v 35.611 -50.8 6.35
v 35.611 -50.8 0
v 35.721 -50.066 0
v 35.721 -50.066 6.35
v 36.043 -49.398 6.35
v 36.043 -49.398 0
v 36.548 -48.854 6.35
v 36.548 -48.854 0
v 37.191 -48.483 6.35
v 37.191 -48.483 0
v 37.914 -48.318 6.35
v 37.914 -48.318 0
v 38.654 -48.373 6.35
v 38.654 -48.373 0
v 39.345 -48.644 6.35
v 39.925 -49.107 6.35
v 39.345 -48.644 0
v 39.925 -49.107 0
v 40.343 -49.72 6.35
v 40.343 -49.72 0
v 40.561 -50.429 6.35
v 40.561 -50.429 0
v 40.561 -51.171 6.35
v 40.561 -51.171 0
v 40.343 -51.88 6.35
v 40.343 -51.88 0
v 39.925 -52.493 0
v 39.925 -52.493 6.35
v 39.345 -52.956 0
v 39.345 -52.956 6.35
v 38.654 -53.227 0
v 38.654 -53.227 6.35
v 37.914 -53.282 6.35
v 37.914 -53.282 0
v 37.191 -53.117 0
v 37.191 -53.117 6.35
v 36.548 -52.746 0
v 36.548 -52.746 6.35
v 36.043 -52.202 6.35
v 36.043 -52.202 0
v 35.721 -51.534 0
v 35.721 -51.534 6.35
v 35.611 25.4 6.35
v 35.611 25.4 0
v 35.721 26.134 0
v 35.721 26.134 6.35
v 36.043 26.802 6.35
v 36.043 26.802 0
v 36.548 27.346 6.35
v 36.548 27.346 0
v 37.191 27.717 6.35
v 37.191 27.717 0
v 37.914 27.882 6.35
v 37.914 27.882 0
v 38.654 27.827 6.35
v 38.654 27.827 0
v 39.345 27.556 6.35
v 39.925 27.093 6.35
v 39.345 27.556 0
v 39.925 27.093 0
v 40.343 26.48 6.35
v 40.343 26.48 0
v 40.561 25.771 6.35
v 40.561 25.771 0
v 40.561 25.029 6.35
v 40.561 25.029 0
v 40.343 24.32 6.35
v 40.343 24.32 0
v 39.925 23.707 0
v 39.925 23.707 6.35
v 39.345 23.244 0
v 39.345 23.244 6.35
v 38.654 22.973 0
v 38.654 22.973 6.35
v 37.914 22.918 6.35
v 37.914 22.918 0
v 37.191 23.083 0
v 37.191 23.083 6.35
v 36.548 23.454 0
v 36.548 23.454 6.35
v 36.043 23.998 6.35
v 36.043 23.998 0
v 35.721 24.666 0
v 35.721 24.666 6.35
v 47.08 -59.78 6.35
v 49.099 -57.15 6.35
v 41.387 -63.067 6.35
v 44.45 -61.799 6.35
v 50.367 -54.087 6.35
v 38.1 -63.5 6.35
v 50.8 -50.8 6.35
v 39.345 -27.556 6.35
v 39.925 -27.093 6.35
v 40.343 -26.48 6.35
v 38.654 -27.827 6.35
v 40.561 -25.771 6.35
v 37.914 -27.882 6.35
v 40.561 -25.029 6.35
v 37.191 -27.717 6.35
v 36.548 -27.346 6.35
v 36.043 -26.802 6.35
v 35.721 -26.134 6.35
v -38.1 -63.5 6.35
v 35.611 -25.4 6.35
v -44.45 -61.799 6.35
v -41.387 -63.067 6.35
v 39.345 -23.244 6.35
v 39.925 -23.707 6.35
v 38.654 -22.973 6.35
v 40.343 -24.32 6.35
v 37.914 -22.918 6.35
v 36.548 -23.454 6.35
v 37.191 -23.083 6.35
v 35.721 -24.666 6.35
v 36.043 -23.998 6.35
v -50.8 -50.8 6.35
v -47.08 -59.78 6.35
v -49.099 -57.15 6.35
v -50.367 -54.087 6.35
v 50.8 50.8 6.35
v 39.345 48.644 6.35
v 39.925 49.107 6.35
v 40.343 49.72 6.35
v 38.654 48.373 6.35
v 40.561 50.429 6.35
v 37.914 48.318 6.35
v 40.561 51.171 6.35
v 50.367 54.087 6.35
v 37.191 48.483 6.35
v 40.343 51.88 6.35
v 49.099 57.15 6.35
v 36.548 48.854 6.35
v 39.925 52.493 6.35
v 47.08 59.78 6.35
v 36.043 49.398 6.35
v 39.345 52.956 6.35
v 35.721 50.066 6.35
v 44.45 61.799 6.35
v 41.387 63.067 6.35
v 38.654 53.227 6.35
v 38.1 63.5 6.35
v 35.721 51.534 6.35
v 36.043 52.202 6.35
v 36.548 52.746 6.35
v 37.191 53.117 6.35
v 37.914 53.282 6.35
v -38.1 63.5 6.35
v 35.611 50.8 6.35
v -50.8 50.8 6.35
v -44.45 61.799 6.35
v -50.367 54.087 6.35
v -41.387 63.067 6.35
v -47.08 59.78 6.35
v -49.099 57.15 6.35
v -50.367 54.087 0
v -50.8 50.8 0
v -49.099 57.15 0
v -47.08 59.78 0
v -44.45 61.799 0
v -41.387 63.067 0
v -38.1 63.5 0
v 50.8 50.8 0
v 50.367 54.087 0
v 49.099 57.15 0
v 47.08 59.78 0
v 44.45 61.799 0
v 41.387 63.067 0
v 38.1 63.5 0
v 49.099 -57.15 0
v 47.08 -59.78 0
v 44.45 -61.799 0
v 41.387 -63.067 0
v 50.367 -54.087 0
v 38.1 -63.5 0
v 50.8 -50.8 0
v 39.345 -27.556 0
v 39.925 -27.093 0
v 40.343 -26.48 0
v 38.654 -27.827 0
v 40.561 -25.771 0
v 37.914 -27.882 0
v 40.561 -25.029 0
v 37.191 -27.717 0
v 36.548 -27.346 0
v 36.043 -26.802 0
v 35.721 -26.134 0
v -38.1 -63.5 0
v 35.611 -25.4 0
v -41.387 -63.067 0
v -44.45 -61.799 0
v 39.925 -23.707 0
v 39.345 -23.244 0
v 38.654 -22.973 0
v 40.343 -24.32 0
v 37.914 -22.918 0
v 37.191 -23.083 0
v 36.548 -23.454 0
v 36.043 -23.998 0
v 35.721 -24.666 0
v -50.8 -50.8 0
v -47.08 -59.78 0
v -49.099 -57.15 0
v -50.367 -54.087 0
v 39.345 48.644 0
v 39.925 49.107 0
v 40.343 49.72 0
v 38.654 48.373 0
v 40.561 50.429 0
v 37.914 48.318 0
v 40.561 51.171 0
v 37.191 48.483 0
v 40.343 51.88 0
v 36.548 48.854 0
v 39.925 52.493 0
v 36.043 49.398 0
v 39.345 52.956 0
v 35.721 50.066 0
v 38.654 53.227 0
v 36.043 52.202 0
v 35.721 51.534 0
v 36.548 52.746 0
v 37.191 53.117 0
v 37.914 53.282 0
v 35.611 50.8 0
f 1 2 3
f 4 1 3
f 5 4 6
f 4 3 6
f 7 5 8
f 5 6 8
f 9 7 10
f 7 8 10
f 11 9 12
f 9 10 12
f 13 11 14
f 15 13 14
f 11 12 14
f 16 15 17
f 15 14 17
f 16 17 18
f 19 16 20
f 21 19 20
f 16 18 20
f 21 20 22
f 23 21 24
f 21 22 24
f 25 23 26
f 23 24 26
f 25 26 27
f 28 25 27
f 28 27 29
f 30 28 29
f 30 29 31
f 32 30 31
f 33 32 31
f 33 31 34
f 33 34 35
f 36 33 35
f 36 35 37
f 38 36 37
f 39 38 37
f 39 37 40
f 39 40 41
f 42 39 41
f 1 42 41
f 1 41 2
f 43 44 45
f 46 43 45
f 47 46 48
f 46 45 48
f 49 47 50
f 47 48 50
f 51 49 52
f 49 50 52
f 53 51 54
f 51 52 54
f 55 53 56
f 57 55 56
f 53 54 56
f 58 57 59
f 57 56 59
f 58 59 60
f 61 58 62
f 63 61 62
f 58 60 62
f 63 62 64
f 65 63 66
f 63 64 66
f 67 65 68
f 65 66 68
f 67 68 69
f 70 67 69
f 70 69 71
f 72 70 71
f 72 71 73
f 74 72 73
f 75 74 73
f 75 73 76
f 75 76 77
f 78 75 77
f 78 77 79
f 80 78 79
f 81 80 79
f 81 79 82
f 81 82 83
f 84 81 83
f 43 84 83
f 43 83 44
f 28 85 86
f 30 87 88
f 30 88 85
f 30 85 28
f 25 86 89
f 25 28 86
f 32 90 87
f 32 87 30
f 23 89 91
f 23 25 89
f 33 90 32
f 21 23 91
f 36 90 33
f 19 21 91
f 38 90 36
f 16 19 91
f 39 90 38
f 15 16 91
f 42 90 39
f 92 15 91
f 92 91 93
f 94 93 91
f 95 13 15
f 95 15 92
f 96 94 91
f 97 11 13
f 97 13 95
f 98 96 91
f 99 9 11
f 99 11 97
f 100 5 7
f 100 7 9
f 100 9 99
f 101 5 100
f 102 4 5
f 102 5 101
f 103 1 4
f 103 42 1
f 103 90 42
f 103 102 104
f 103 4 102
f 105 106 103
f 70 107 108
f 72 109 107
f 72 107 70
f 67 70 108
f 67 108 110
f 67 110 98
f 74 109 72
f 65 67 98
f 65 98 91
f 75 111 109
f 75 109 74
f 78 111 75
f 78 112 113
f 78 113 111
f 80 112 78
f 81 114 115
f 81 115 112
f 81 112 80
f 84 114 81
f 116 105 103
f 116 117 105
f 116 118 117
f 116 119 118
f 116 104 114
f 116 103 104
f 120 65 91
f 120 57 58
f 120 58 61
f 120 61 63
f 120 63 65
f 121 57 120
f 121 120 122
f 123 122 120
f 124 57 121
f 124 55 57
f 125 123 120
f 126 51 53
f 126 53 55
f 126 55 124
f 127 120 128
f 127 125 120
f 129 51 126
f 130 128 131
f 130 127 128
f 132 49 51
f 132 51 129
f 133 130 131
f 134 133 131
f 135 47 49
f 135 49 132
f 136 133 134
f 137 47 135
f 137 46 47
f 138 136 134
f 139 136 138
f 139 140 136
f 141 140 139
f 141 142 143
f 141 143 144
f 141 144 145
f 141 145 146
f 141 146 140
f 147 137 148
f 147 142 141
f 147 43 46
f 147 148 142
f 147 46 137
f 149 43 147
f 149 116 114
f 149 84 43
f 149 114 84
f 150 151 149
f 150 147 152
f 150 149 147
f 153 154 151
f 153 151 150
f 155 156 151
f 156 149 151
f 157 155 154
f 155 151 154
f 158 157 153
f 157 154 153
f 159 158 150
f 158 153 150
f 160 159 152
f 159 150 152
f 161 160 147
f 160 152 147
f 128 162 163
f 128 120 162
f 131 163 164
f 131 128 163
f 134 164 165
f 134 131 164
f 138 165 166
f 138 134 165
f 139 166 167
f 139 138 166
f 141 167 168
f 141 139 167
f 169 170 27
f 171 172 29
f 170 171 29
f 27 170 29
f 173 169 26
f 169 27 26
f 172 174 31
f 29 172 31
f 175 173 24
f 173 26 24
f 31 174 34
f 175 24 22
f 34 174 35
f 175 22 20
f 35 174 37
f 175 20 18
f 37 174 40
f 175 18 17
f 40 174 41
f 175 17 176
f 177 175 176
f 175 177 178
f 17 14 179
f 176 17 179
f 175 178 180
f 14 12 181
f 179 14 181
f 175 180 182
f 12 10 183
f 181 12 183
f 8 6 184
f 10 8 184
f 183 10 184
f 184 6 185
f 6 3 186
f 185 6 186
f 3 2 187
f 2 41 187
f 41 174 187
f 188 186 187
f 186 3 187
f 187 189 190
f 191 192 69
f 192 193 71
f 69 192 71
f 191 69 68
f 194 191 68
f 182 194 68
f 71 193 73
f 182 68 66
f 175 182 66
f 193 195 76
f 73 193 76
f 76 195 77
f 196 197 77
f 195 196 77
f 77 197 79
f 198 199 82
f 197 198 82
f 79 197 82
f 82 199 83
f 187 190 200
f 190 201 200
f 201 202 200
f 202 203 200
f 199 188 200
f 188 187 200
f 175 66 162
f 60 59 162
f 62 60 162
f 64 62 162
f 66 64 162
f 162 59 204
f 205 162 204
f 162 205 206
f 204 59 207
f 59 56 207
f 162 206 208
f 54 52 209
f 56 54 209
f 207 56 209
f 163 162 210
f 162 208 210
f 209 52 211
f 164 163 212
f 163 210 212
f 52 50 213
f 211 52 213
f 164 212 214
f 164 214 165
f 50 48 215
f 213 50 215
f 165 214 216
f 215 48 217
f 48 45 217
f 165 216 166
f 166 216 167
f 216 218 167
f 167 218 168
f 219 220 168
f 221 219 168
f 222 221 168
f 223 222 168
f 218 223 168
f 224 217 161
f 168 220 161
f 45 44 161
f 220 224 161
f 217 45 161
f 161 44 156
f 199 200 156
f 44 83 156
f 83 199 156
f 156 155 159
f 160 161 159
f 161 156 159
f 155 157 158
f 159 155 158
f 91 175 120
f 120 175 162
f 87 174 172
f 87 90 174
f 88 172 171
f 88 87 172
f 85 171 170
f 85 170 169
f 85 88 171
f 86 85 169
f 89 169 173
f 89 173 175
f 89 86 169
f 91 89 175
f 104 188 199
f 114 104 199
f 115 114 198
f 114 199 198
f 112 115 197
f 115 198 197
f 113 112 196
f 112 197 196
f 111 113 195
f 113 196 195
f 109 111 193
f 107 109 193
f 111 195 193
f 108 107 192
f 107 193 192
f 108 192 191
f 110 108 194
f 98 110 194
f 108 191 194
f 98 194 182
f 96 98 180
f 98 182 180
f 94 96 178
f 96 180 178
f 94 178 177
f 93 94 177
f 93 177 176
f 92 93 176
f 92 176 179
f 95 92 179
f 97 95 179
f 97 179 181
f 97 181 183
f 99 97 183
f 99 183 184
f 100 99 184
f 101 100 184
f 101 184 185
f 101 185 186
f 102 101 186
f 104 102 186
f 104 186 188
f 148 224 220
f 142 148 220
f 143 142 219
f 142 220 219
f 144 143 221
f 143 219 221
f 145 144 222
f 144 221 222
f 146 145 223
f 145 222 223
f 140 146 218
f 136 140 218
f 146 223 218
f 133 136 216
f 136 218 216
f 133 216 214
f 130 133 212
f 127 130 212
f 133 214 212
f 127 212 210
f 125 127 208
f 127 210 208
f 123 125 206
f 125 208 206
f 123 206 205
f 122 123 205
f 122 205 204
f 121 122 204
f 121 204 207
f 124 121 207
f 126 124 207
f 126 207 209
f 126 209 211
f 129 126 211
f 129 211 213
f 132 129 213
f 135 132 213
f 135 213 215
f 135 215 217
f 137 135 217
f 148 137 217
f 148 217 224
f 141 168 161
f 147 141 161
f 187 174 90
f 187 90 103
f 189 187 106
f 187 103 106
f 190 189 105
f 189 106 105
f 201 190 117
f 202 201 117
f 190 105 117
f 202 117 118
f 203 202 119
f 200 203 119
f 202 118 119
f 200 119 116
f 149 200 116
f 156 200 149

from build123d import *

# Parameters (mm, degrees)
SKETCH1_W                  = 127
SKETCH1_H                  = 101.6
BOSS_EXTRUDE1_DEPTH        = 6.35
F_9_0_196_DIAMETER_HOLE1_D = 4.9784
FILLET1_R                  = 12.7


with BuildPart() as part:
    # Sketch1 → Boss-Extrude1 (new body)
    with BuildSketch(Plane(origin=(0, 0, 0), x_dir=(0, 1, 0), z_dir=(0, 0, 1))):
        Rectangle(SKETCH1_W, SKETCH1_H)
    extrude(amount=BOSS_EXTRUDE1_DEPTH)

    # #9 (0.196) Diameter Hole1 (through all)
    with Locations(Plane.XY.offset(6.35)):
        with Locations((38.1, -50.8), (38.1, -25.4), (38.1, 25.4), (38.1, 50.8)):
            Hole(F_9_0_196_DIAMETER_HOLE1_D / 2)

    # Fillet1
    fillet1_edges = [part.edges().sort_by_distance(p)[0] for p in [
        (50.8, 63.5, 3.175),
        (50.8, -63.5, 3.175),
        (-50.8, -63.5, 3.175),
        (-50.8, 63.5, 3.175),
    ]]
    fillet(fillet1_edges, radius=FILLET1_R)


solid = part.part
